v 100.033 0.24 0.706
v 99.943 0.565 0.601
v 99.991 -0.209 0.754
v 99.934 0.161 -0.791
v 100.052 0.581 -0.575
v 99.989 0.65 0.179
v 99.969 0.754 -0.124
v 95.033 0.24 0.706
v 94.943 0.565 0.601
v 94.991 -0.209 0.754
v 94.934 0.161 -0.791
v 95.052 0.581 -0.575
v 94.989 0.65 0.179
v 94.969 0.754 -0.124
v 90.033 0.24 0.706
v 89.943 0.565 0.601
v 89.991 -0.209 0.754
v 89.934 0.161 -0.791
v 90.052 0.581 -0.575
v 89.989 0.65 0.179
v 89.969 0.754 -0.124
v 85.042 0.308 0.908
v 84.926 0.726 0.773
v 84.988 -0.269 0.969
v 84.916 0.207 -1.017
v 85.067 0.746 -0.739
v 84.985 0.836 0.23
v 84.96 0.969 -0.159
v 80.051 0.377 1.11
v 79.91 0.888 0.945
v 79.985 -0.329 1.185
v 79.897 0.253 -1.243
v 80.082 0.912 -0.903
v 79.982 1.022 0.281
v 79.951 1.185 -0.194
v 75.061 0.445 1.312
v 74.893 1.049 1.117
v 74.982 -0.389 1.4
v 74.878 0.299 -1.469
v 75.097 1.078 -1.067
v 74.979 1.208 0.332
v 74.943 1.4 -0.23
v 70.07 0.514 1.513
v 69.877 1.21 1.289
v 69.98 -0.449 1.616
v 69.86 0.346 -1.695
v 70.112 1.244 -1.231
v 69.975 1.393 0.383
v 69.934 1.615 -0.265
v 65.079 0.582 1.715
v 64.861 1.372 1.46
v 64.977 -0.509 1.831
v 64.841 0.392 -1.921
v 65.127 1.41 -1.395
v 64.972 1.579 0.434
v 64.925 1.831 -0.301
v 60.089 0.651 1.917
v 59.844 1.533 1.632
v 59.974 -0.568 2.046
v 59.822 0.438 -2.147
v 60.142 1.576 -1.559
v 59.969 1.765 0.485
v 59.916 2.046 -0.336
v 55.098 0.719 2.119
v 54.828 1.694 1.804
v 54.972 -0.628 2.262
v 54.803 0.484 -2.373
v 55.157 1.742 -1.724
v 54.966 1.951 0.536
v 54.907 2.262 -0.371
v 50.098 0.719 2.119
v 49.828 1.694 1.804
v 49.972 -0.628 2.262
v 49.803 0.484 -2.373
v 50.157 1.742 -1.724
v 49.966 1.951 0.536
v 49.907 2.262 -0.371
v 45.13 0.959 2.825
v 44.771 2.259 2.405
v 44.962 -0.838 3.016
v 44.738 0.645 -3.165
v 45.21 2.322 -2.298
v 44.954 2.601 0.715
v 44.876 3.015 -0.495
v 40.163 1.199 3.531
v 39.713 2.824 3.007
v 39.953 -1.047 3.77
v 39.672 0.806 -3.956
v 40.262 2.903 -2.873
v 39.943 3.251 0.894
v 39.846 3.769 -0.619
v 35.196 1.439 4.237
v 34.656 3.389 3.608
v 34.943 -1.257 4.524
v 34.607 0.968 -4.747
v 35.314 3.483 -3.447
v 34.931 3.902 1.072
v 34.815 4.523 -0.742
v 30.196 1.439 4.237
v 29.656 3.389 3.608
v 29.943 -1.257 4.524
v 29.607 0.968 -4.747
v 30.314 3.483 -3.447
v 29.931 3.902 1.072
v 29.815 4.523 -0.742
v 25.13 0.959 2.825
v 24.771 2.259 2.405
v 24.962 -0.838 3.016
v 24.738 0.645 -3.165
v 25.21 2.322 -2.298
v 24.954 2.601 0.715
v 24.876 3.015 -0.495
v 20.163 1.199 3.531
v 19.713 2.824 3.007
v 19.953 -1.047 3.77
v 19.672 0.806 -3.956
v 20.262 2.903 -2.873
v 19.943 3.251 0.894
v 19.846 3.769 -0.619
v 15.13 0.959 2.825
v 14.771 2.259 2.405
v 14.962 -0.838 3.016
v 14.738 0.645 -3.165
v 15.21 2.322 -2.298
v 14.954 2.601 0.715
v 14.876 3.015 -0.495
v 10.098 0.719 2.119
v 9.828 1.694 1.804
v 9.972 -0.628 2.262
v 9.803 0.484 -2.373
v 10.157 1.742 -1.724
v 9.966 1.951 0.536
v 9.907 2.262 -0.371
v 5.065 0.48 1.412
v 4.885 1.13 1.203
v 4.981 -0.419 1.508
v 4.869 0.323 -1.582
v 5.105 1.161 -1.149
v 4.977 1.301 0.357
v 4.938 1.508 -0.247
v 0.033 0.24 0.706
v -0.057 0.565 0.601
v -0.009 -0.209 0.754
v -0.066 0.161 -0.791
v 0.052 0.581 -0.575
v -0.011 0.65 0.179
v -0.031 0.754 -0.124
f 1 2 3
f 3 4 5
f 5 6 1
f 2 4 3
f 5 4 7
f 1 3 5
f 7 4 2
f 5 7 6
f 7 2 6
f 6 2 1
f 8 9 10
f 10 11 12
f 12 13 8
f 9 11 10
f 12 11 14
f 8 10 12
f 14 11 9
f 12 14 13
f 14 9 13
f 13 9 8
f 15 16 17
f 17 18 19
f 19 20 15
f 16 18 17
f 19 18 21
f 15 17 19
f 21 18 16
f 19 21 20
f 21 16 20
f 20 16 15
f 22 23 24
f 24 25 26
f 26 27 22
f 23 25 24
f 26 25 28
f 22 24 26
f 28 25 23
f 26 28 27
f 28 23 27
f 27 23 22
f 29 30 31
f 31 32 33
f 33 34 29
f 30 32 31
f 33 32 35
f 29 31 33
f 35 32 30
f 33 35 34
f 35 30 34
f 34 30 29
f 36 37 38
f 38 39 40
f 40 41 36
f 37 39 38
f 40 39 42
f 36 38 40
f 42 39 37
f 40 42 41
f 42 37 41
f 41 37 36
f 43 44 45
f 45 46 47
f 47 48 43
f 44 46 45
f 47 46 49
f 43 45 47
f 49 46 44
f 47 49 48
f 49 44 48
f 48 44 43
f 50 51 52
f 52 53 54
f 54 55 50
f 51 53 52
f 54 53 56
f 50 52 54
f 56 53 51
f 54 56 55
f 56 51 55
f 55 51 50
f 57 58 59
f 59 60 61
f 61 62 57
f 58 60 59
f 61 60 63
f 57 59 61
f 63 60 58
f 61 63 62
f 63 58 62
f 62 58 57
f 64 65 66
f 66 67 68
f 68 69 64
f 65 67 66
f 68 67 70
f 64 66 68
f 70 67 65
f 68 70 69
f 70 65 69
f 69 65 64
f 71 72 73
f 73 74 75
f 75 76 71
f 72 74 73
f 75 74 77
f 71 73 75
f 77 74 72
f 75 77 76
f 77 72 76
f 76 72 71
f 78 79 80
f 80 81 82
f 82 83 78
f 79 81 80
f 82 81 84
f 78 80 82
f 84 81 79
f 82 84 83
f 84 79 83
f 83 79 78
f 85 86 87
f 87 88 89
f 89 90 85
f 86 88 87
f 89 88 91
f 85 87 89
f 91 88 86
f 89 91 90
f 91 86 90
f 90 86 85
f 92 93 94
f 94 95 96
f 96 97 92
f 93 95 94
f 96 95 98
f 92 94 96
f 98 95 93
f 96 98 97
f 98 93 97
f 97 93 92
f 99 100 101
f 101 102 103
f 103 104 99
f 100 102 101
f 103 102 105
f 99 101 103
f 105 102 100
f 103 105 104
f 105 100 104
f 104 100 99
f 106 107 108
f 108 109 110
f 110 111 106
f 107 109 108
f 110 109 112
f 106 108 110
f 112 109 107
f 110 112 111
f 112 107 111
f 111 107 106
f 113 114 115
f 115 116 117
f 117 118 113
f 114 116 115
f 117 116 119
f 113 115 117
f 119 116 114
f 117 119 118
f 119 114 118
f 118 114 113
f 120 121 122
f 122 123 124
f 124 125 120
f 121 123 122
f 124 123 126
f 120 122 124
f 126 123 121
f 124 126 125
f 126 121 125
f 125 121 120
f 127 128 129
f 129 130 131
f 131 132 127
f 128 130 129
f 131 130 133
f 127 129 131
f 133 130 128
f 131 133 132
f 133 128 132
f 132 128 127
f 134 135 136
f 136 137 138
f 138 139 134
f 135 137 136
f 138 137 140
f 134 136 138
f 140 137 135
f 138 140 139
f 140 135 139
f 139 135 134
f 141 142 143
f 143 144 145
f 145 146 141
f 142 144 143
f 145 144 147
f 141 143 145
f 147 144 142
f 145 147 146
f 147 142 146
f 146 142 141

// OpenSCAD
DNA1=[
[5,[3,[5 ,0,0]]],
[0,[1,[15,0,1]]],
[1,[1,[15,0,1]]],
[5,[3,[5 ,0,0]]],
[1,[1,[5,0,-1]]],
[15,[1,[5 ,0,0]]]
];
DNA2=[
[3,[1,[5,0,0]]],
[1,[4,[5,0,0]]],
[3,[6,[5,0,0]]],
[7,[3,[5,0,0]]],
[1,[1,[5,0,0]]],
[10,[1,[5,0,0]]]
];

ring=xring(12);
echo(ring);
/*[
[0,0,-1],[0,0.7,-0.7],
[0,1,0],[0,0.7,0.7],
[0,0,1],[0,-0.7,0.7],
[0,-1,0],[0,-0.7,-0.7]];*/

groove=0.75;
for(r=[0:0.1:0]){
   translate([0,100*r,0]){
       runner(DNA1*r+DNA2*(1-r)) ;
       };
       }

module runner(DNA) {
size=DNA[0][1][0];
nextsize=DNA[1][1][0];
steps=ceil(DNA[0][0]);
stepsize=(nextsize-size)/steps;

startstate=[[0,0,0],size,stepsize,0,
        steps];
polyhedron (ring*size*groove,[[for(i=[0:len(ring)-1])i]]);

trunk(startstate,ring,DNA );
}

module trunk(state,ring,map)
{ 
    //echo(m,state);
    pos=state[0];
    m1=0.8;m2=0.2;
    m=state[3];
    n=state[4];
    sizestep=state[2];
    size=state[1]+sizestep;
    nextsize=size ; 
         
    move=map[m][1][1];
    nextpos=pos+move;
    thisring=[for(i=[0:len(ring)-1])ring[i]*size*groove+pos];
    midring1=[for(i=[0:len(ring)-1])ring[i]*(size*m1+nextsize*m2)+(pos*m1+nextpos*m2)];   midring2=[for(i=[0:len(ring)-1])ring[i]*(size*m2+nextsize*m1)+(pos*m2+nextpos*m1)];
        
    nextring=[for(i=[0:len(ring)-1])ring[i]*nextsize*groove+nextpos];
    union(){
        bridge(thisring,midring1);
        bridge(midring1,midring2);
        bridge(midring2,nextring);
//polyhedron (thisring,[[for(i=[0:len(ring)-1])i]]);
//polyhedron (midring1,[[for(i=[0:len(ring)-1])i]]);
//polyhedron (midring2,[[for(i=[0:len(ring)-1])i]]);
//polyhedron (nextring,[[for(i=[0:len(ring)-1])i]]);
};
 if (m<len(map) && n<=0){
     
     nextsizestep=(map[min(m+2,len(map))][1][0]-map[min(m+1,len(map))][1][0])/(map[m+1][0]);
     nextstate=[nextpos,map[m+1][1][0]-nextsizestep,nextsizestep,m+1,ceil(map[m+1][0])];
     
    color(rndc())  trunk(nextstate,ring,map);} 
     
     else if (m<len(map)-1){ 
         nextstate=[nextpos,size,sizestep,m,n-1];
         trunk(nextstate,ring,map);}
         polyhedron (nextring,[[for(i=[0:len(ring)-1])i]]);
 }    
 
 module bridge(r1,r2){
     n=len(r1);
     l=[for(i=[0:n])[i, (i+1)%n,n+(i+1)%n,n+i]];
     polyhedron(
     concat(r1,r2),l);
     
 };
 
  module bridgeext(r1,r2){
     n=len(r1);
      
     polyhedron(
     concat(r1,r2),[[0,1,9,8],[1,2,10,9]]); 

  
      color(rndc()) polyhedron(
     concat(r1,r2),[[2,3,11,10],[3,4,12,11]]);
     
color(rndc()) polyhedron(
     concat(r1,r2),[[4,5,13,12],[5,6,14,13]]); 
     
      polyhedron(
     concat(r1,r2),[[6,7,15,14],[7,0,8,15]]);
    
 };
                  
 
 
 
 
 
 
 
 
 
 
 
 
     function xring(x=8,v=0,s=0)= mirring([for(i=[(360/x)*-0.5:360/x:359])[0,sin(i),cos(i)]+rndV()*0.1]);
 
function  mirring(ring)=let( n=len(ring)-1)concat( [for(i=[0:floor(n/2)])ring[i]],[ for (i=[0:floor(n/2)])ring[floor(n/2)-i]]
); 
 
 function rndR()=[rands(0,360,1)[0],rands(0,360,1)[1],rands(0,360,1)[0]];
function rndV()=[rands(-1,1,1)[0],rands(-1,1,1)[0],rands(-1,1,1)[0]];
function midpoint(start,end) = start + (end  - start )/2;
function rndc()=[rands(0,1,1)[0],rands(0,1,1)[0],rands(0,1,1)[0]];

 
 
 
 function lerp(start,end,bias ) = (end * bias + start * (1 - bias));
function geteuler(v) = [0, -asin(v[2]), atan2(v2xy(v)[1], v2xy(v)[0])]; //Euler angles from Vec3
function v2xy(v) = lim3(1, [v[0], v[1], 0]); // down projection xyz2xy
function lim3(l, v) = v / len3(v) * l; // normalize Vec37Vec4 to magnitude l
function len3(v) = sqrt(pow(v[0], 2) + pow(v[1], 2) + pow(v[2], 2)); // find magnitude of Vec3
function v(i,v)=v[i+1]-v[i]; // vec3 from polyline segment
function t(v) = [v[0], v[1], v[2]];// purge vec4... down to vec3 (for translate to play nice)
